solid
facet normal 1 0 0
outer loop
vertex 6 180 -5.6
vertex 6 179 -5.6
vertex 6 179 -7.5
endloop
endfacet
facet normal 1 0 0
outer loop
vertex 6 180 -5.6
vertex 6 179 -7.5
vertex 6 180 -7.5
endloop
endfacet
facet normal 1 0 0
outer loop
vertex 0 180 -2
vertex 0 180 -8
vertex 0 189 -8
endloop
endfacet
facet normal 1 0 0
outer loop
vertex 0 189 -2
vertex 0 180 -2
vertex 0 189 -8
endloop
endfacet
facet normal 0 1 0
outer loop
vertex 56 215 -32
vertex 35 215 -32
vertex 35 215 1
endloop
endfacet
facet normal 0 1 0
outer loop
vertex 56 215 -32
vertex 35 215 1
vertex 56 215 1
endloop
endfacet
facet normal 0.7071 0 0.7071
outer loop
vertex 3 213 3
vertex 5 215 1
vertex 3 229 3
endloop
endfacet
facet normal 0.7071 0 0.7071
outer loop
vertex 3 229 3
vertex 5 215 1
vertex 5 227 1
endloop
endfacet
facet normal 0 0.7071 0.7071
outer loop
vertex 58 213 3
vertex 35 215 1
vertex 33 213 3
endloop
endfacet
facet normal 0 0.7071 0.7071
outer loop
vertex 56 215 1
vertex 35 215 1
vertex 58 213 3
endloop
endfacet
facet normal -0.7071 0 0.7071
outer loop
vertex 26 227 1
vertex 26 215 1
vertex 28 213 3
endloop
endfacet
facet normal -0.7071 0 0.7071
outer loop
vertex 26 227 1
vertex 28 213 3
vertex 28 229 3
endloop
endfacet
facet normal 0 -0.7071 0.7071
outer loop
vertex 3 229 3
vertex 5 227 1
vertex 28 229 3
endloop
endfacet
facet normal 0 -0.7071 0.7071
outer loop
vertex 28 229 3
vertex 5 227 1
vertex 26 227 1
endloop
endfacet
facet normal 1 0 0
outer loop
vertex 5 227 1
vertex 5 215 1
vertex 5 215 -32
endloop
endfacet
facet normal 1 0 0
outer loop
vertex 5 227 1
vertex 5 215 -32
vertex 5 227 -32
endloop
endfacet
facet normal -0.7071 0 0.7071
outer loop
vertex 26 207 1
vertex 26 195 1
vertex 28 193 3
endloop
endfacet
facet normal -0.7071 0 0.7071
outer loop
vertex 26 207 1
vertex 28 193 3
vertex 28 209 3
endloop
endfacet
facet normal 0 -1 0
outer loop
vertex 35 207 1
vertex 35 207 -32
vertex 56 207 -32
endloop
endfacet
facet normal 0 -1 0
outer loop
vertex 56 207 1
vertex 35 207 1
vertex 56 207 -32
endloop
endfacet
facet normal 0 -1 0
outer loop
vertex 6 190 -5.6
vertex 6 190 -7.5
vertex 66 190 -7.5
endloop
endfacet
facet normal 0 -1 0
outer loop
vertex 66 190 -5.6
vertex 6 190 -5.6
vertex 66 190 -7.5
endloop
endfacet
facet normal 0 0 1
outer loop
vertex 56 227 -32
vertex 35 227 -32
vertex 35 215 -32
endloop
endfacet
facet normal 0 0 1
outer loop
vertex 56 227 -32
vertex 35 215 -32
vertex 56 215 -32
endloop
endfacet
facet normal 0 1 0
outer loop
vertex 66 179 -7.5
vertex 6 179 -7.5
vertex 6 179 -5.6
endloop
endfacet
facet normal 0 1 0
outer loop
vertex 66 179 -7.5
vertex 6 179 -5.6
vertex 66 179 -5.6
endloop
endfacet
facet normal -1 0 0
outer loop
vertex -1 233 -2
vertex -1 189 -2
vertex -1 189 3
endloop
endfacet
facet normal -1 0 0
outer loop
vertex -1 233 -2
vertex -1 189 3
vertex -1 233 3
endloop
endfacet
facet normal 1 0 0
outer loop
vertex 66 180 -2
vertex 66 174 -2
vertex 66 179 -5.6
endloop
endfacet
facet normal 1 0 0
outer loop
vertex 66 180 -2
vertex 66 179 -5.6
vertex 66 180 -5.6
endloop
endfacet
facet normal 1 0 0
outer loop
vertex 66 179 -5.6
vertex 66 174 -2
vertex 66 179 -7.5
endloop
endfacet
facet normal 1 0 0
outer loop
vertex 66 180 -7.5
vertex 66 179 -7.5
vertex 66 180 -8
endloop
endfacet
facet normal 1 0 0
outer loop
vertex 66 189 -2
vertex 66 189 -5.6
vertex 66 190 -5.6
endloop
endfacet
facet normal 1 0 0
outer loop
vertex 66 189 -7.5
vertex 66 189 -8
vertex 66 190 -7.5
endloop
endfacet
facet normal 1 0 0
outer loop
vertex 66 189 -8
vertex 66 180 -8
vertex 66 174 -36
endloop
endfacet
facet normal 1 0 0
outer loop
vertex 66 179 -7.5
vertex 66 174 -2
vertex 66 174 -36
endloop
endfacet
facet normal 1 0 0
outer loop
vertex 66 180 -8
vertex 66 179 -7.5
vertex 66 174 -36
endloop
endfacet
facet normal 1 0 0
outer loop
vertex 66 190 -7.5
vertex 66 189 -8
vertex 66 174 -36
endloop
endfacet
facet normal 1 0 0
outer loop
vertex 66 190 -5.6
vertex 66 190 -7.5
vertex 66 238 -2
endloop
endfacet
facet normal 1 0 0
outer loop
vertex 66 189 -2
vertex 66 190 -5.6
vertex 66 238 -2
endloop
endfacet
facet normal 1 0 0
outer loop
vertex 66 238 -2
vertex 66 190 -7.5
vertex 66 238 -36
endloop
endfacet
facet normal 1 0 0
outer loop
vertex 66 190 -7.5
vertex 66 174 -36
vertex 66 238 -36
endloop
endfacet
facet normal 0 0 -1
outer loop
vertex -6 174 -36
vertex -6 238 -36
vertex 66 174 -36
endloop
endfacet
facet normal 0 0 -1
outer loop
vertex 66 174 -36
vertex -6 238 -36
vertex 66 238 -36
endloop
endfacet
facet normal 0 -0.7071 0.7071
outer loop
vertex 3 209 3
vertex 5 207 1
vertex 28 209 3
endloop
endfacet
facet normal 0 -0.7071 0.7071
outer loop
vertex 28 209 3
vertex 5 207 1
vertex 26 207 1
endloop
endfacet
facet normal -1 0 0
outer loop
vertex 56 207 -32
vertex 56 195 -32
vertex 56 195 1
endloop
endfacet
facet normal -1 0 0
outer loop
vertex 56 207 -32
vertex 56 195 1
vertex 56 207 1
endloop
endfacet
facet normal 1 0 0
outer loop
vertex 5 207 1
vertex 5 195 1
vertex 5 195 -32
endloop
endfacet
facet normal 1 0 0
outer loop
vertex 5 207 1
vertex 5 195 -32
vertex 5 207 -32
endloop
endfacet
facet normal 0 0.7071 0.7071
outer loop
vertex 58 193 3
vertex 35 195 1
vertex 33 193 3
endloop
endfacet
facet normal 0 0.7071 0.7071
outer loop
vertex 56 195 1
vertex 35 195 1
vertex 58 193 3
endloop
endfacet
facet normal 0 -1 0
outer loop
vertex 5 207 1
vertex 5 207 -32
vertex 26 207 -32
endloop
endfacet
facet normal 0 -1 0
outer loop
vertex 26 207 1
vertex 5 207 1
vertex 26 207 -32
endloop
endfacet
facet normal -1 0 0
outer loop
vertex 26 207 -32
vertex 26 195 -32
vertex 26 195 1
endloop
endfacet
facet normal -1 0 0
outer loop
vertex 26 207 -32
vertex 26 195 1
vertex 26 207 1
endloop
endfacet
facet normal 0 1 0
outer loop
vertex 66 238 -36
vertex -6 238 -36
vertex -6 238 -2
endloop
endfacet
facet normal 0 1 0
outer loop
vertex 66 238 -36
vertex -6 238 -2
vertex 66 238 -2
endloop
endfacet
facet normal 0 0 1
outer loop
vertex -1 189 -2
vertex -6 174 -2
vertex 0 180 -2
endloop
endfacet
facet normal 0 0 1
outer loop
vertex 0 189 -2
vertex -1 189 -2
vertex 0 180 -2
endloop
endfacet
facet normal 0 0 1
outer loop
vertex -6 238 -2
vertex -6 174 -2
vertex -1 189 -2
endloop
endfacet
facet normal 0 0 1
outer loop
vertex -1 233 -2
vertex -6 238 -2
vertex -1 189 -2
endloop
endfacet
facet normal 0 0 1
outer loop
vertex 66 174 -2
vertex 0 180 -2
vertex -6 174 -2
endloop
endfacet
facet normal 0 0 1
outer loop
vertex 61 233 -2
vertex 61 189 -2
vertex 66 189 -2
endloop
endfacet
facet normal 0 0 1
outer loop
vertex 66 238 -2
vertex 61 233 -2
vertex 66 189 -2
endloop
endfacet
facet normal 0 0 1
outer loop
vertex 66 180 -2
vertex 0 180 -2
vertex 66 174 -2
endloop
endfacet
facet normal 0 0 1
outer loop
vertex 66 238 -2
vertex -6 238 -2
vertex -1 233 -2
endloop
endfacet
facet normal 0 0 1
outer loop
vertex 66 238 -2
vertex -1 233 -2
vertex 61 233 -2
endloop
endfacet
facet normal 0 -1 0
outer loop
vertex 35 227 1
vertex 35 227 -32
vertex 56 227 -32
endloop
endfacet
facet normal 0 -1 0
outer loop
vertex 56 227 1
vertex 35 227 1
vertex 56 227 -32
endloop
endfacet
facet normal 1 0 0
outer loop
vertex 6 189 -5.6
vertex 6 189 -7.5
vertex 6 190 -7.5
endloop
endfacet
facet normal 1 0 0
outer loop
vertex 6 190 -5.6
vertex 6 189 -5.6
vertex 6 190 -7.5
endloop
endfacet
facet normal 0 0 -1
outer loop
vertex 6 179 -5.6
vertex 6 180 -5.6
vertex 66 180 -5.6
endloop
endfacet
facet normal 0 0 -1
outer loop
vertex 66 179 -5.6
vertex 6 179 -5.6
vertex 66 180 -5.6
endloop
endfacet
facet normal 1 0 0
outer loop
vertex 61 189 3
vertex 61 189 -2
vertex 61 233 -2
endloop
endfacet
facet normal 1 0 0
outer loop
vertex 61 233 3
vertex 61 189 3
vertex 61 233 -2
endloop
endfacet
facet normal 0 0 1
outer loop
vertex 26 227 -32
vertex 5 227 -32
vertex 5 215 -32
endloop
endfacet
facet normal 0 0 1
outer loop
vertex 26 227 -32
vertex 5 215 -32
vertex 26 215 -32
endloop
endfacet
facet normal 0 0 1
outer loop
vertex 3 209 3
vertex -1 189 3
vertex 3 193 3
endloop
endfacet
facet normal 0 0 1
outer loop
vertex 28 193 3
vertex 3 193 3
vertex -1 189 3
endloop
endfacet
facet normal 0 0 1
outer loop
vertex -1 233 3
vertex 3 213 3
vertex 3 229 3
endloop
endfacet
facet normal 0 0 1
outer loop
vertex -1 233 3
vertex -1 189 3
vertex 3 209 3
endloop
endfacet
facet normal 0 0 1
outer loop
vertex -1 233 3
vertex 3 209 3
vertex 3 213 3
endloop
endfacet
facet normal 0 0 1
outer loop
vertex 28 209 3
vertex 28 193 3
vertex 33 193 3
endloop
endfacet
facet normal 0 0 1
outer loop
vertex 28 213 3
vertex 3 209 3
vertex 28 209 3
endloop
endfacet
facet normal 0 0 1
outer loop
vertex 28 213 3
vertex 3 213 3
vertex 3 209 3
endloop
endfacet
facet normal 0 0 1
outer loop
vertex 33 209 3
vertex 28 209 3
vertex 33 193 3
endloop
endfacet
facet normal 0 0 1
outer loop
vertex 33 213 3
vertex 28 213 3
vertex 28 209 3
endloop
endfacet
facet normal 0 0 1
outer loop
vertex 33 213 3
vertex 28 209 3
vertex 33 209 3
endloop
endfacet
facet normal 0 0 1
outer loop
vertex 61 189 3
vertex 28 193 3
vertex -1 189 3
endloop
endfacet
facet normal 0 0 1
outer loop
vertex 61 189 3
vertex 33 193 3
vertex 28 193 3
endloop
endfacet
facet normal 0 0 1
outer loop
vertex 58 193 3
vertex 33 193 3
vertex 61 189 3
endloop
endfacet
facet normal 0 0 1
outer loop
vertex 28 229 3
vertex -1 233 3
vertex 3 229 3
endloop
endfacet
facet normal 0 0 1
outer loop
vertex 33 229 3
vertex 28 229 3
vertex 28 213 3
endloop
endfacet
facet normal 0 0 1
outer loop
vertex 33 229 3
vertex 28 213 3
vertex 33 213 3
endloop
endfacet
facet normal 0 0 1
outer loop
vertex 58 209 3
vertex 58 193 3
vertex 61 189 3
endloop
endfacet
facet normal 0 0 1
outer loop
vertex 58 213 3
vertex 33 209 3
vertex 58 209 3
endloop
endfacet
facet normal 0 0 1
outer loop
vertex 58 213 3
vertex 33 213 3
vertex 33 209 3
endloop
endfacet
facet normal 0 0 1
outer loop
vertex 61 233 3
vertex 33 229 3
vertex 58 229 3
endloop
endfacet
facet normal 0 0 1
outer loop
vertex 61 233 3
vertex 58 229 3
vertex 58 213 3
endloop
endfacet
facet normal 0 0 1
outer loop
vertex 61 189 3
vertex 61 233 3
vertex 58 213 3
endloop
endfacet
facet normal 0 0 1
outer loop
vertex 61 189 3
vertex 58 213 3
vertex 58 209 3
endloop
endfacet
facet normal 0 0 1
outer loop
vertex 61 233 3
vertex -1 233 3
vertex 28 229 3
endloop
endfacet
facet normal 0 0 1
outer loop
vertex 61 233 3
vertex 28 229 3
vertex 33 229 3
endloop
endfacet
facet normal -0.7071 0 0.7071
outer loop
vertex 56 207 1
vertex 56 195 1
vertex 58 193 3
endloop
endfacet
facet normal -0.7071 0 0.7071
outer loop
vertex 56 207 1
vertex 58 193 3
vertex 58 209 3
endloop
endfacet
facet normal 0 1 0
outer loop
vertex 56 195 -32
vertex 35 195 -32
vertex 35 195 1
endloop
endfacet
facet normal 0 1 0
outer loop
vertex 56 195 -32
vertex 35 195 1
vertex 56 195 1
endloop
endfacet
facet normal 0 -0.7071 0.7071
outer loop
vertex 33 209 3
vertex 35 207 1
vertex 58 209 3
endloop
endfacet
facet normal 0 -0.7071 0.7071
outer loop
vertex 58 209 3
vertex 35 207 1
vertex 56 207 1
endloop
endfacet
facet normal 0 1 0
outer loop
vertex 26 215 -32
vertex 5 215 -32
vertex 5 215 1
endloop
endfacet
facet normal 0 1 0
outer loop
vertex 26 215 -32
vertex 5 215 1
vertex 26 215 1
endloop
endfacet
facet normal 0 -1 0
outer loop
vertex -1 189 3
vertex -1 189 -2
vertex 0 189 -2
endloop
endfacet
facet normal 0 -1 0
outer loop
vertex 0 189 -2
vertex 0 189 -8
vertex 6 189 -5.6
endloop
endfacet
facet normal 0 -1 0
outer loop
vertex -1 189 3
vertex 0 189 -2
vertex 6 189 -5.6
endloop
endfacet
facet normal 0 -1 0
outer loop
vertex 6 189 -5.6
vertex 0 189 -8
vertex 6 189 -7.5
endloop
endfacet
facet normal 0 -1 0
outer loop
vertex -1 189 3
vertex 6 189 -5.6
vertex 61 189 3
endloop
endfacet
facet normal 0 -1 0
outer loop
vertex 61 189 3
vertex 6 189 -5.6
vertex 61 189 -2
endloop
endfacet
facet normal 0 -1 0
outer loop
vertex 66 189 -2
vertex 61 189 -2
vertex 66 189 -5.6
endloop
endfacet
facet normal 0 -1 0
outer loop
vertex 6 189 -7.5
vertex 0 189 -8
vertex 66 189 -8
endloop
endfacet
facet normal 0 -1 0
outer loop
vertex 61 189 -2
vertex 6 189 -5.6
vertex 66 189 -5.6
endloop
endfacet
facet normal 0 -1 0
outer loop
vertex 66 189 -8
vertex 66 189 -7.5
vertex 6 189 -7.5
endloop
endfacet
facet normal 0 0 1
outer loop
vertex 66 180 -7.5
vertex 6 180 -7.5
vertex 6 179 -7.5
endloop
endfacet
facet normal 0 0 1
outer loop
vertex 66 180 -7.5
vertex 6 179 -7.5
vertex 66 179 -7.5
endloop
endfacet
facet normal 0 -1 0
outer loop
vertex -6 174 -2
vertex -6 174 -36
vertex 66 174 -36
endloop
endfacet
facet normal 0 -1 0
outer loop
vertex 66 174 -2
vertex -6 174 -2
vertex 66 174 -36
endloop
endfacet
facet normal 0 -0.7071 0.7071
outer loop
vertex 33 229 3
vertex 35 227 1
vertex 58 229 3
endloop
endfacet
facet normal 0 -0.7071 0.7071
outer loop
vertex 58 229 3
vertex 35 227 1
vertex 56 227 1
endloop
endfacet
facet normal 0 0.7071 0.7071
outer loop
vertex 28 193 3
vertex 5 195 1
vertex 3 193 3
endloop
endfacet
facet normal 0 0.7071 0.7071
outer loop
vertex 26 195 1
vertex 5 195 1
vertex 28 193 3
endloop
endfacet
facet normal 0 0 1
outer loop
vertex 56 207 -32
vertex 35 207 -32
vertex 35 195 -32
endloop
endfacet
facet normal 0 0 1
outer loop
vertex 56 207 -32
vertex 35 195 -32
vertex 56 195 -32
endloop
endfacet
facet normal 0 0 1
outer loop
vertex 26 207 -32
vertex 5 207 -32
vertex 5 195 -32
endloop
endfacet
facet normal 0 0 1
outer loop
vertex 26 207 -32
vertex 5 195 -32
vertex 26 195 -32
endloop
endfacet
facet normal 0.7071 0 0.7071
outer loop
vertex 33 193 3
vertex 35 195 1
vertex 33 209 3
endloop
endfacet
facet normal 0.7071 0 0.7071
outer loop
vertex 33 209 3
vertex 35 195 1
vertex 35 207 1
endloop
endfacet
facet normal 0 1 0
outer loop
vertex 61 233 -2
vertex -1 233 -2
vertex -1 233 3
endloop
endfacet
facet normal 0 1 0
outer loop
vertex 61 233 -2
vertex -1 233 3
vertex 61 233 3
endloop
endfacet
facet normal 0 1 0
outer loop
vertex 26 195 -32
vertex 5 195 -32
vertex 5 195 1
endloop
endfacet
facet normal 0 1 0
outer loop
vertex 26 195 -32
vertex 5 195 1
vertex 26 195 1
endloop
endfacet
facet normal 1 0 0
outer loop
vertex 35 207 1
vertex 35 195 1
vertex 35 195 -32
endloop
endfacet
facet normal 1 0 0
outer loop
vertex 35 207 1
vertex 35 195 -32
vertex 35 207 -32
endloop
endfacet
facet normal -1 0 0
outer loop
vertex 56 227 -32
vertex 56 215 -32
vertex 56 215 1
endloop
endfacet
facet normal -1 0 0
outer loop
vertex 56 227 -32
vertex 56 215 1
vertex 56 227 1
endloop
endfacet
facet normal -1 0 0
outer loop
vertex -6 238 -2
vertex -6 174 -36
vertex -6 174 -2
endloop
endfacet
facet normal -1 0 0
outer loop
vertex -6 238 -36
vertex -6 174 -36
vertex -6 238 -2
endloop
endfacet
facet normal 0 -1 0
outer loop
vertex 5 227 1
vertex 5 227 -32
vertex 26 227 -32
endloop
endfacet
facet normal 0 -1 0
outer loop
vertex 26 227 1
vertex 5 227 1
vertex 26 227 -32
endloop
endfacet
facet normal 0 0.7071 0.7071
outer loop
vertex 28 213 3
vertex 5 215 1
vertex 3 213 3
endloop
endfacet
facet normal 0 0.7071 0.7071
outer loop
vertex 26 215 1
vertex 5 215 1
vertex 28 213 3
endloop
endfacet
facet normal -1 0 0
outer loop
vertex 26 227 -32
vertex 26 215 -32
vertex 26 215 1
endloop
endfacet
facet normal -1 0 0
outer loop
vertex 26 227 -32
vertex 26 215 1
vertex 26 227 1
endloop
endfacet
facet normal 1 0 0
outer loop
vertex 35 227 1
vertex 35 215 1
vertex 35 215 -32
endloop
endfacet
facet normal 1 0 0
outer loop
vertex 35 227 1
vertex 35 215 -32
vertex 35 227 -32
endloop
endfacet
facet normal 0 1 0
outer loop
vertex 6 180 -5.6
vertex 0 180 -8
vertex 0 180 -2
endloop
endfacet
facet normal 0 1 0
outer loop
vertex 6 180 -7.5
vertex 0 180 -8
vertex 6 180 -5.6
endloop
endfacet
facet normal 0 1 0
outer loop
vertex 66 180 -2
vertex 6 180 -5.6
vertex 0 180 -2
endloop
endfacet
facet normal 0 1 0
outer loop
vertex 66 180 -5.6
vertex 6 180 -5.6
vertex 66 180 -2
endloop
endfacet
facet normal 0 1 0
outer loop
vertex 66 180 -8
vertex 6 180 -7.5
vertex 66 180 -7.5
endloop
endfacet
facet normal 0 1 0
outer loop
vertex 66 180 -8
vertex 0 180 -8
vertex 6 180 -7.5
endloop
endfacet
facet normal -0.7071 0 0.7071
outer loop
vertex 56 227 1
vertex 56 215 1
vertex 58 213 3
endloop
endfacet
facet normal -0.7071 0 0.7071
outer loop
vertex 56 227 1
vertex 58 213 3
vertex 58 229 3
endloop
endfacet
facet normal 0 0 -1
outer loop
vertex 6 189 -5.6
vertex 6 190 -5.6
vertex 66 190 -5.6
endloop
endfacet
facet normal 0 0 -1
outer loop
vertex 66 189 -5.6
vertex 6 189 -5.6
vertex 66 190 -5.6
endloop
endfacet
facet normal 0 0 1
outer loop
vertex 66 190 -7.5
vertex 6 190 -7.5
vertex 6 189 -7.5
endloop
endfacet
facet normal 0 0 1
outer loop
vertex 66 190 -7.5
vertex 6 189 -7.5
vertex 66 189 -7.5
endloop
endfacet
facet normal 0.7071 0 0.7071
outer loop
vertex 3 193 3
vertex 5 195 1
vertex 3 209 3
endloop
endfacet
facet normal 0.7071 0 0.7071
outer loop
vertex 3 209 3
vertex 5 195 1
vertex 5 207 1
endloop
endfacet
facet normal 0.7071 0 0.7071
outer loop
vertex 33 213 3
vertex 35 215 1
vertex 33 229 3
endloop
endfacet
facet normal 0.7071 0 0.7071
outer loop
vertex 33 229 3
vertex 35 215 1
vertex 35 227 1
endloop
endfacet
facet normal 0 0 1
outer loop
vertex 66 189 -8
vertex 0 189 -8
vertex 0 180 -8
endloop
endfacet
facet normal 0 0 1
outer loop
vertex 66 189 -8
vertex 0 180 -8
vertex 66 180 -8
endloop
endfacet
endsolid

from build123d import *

# Parameters (mm, degrees)
BOX011_W        = 60
BOX011_H        = 11
BOX011_DEPTH    = 1.9
BOX010_W        = 72
BOX010_H        = 8
BOX010_DEPTH    = 34
BOX009_W        = 6
BOX009_H        = 49
BOX009_DEPTH    = 34
BOX008_W        = 6
BOX008_H        = 64
BOX008_DEPTH    = 34
BOX007_W        = 72
BOX007_H        = 6
BOX007_DEPTH    = 34
BOX003_W        = 25
BOX003_H        = 16
BOX003_DEPTH    = 4
CHAMFER001_SIZE = 3
BOX002_W        = 21
BOX002_H        = 12
BOX002_DEPTH    = 35
BOX004_W        = 62
BOX004_H        = 44
BOX004_DEPTH    = 39
BOX012_W        = 72
BOX012_H        = 15
BOX012_DEPTH    = 28


with BuildPart() as cube010:
    # Box011 → Box011 (new body)
    with BuildSketch(Plane(origin=(6, 179, -7.5), x_dir=(1, 0, 0), z_dir=(0, 0, 1))):
        with Locations((30, 5.5)):
            Rectangle(BOX011_W, BOX011_H)
    extrude(amount=BOX011_DEPTH)


with BuildPart() as cube009:
    # Box010 → Box010 (new body)
    with BuildSketch(Plane(origin=(-6, 230, -36), x_dir=(1, 0, 0), z_dir=(0, 0, 1))):
        with Locations((36, 4)):
            Rectangle(BOX010_W, BOX010_H)
    extrude(amount=BOX010_DEPTH)


with BuildPart() as cube008:
    # Box009 → Box009 (new body)
    with BuildSketch(Plane(origin=(60, 189, -36), x_dir=(1, 0, 0), z_dir=(0, 0, 1))):
        with Locations((3, 24.5)):
            Rectangle(BOX009_W, BOX009_H)
    extrude(amount=BOX009_DEPTH)


with BuildPart() as cube007:
    # Box008 → Box008 (new body)
    with BuildSketch(Plane(origin=(-6, 174, -36), x_dir=(1, 0, 0), z_dir=(0, 0, 1))):
        with Locations((3, 32)):
            Rectangle(BOX008_W, BOX008_H)
    extrude(amount=BOX008_DEPTH)


with BuildPart() as cube006:
    # Box007 → Box007 (new body)
    with BuildSketch(Plane(origin=(-6, 174, -36), x_dir=(1, 0, 0), z_dir=(0, 0, 1))):
        with Locations((36, 3)):
            Rectangle(BOX007_W, BOX007_H)
    extrude(amount=BOX007_DEPTH)


with BuildPart() as chamfer001:
    # Box003 → Box003 (new body)
    with BuildSketch(Plane(origin=(-2, -2, 32), x_dir=(1, 0, 0), z_dir=(0, 0, 1))):
        with Locations((12.5, 8)):
            Rectangle(BOX003_W, BOX003_H)
    extrude(amount=BOX003_DEPTH)

    # Chamfer001
    chamfer001_edges = [chamfer001.edges().sort_by_distance(p)[0] for p in [
        (-2, 6, 32),
        (23, 6, 32),
        (10.5, -2, 32),
        (10.5, 14, 32),
    ]]
    chamfer(chamfer001_edges, length=CHAMFER001_SIZE)


with BuildPart() as usbstickaussparung:
    # Box002 → Box002 (new body)
    with BuildSketch(Plane.XY):
        with Locations((10.5, 6)):
            Rectangle(BOX002_W, BOX002_H)
    extrude(amount=BOX002_DEPTH)

    # Fusion001: union Chamfer001
    add(chamfer001.part)


with BuildPart() as usbstickaussparung_1:
    # Fusion001 placement: moved
    add(usbstickaussparung.part.moved(Location((30, 175, 0))))


with BuildPart() as clone_of_usbstickaussparung001:
    # Clone001 base: copy of USBStickAussparung
    add(usbstickaussparung_1.part)


with BuildPart() as clone_of_usbstickaussparung001_1:
    # Clone001 placement: moved
    add(clone_of_usbstickaussparung001.part.moved(Location((-30, 0, 0))))


with BuildPart() as clone_of_usbstickaussparung:
    # Clone base: copy of USBStickAussparung
    add(usbstickaussparung_1.part)


with BuildPart() as clone_of_usbstickaussparung_1:
    # Clone placement: moved
    add(clone_of_usbstickaussparung.part.moved(Location((0, -20, 0))))


with BuildPart() as usbaussparungen:
    # Clone002 base: copy of USBStickAussparung
    add(usbstickaussparung_1.part)


with BuildPart() as usbaussparungen_1:
    # Clone002 placement: moved
    add(usbaussparungen.part.moved(Location((-30, -20, 0))))

    # Fusion002: union USBStickAussparung, Clone of USBStickAussparung001, Clone of USBStickAussparung
    add(usbstickaussparung_1.part)
    add(clone_of_usbstickaussparung001_1.part)
    add(clone_of_usbstickaussparung_1.part)


with BuildPart() as usbaussparungen_2:
    # Fusion002 placement: moved
    add(usbaussparungen_1.part.moved(Location((5, 0, 4))))


with BuildPart() as usbhalter:
    # Box004 → Box004 (new body)
    with BuildSketch(Plane(origin=(-1, 149, 0), x_dir=(1, 0, 0), z_dir=(0, 0, 1))):
        with Locations((31, 22)):
            Rectangle(BOX004_W, BOX004_H)
    extrude(amount=BOX004_DEPTH)

    # Cut: cut USBAussparungen
    add(usbaussparungen_2.part, mode=Mode.SUBTRACT)


with BuildPart() as usbhalter_1:
    # Cut placement: moved
    add(usbhalter.part.moved(Location((0, 40, -36))))


with BuildPart() as halterblock:
    # Box012 → Box012 (new body)
    with BuildSketch(Plane(origin=(-6, 174, -36), x_dir=(1, 0, 0), z_dir=(0, 0, 1))):
        with Locations((36, 7.5)):
            Rectangle(BOX012_W, BOX012_H)
    extrude(amount=BOX012_DEPTH)

    # Fusion003: union Cube009, Cube008, Cube007, Cube006, USBHalter
    add(cube009.part)
    add(cube008.part)
    add(cube007.part)
    add(cube006.part)
    add(usbhalter_1.part)

    # Cut003: cut Cube010
    add(cube010.part, mode=Mode.SUBTRACT)


solid = halterblock.part
